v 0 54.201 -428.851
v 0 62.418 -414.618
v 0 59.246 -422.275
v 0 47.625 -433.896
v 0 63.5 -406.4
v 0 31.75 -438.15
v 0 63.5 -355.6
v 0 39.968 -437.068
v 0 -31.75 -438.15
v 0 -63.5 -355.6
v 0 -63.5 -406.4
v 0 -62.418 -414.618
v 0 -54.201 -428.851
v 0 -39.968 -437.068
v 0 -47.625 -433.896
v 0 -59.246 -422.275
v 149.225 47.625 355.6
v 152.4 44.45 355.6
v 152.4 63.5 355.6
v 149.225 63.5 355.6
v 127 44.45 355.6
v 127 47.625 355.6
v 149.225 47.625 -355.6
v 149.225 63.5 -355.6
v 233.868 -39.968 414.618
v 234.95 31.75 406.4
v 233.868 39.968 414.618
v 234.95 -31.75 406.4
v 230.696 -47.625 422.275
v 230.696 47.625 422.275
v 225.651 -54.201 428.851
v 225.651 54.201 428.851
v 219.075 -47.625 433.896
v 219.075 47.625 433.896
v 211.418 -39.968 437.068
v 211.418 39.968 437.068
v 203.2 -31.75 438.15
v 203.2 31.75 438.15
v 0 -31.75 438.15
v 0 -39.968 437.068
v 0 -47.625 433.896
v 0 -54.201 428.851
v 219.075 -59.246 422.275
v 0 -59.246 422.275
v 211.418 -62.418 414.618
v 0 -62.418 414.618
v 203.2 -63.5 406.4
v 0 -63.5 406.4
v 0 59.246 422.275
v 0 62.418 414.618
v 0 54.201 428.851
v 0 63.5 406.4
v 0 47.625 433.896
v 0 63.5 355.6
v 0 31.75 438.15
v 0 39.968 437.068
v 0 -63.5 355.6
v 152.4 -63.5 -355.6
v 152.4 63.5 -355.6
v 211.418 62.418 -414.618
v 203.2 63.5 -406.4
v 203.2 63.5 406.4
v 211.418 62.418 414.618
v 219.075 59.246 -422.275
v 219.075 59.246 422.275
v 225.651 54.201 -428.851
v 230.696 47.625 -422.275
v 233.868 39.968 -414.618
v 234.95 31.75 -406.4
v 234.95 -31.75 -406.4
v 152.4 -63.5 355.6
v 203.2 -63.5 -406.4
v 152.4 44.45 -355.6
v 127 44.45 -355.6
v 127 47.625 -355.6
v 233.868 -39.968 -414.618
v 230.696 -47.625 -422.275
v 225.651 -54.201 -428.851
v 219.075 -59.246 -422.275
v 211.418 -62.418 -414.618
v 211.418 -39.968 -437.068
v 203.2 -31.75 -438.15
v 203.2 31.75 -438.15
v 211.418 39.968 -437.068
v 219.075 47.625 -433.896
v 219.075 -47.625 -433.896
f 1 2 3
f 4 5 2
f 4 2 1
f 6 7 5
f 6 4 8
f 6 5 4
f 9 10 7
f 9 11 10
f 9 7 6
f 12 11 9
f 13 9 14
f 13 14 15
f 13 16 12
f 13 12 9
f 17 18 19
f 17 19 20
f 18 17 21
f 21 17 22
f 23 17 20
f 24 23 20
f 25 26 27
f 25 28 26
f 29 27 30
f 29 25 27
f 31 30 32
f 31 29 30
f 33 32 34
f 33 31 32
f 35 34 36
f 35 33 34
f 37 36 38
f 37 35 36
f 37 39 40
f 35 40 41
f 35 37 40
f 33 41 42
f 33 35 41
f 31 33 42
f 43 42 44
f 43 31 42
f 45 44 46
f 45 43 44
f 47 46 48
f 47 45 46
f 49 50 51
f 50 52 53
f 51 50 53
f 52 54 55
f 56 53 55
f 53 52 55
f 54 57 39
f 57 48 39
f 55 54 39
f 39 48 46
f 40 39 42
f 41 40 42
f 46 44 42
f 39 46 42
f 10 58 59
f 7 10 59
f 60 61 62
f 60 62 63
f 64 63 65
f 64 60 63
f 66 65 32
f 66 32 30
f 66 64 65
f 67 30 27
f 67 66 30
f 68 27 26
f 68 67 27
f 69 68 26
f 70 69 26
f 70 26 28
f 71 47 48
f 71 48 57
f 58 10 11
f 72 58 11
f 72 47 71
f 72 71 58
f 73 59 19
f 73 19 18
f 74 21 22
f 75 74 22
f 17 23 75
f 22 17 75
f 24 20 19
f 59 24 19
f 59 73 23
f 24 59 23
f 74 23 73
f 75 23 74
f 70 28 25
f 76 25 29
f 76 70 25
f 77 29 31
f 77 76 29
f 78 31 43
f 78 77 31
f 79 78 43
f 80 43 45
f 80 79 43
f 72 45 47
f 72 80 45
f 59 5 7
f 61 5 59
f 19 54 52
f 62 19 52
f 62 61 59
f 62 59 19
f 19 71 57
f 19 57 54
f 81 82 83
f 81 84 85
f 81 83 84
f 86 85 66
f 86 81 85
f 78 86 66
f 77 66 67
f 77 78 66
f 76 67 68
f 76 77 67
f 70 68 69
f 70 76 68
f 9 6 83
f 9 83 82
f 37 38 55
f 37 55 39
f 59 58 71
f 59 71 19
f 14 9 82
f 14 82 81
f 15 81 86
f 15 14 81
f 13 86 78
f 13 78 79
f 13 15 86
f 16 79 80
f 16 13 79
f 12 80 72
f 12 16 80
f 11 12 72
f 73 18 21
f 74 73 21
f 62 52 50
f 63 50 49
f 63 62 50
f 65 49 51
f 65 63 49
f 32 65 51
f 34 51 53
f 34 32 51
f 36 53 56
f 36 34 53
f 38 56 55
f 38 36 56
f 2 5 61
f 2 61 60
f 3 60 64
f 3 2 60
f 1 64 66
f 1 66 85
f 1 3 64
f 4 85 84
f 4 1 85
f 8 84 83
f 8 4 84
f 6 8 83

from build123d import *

# Parameters (mm, degrees)
CUT_EXTRUDE1_DEPTH      = 502.207716421
CUT_EXTRUDE1_DEPTH_BACK = 502.207716421
SKETCH4_W               = 22.225
SKETCH4_H               = 3.175
BOSS_EXTRUDE1_DEPTH     = 711.2


with BuildPart() as part:
    # Sweep1: sweep along a path in Sketch2
    with BuildLine(Plane(origin=(0, 0, 0), x_dir=(1, 0, 0), z_dir=(0, 1, 0))) as sweep1_path:
        Line((0, -355.6), (152.4, -355.6))
        Line((152.4, -355.6), (152.4, 355.6))
        Line((152.4, 355.6), (0, 355.6))
    # Sketch1 → Sweep1 (sweep)
    with BuildSketch(Plane(origin=(0, 0, 0), x_dir=(0, 0, -1), z_dir=(1, 0, 0))):
        with BuildLine():
            Line((-374.65, 63.5), (-355.6, 63.5))
            Line((-355.6, 63.5), (-355.6, -63.5))
            Line((-355.6, -63.5), (-374.65, -63.5))
            Line((-374.65, -63.5), (-406.4, -63.5))
            ThreePointArc((-406.4, -63.5), (-428.850640303, -54.200640303), (-438.15, -31.75))
            Line((-438.15, -31.75), (-438.15, 31.75))
            ThreePointArc((-438.15, 31.75), (-428.850640303, 54.200640303), (-406.4, 63.5))
            Line((-406.4, 63.5), (-374.65, 63.5))
        make_face()
    sweep(path=sweep1_path.line, transition=Transition.RIGHT)

    # Sketch3 → Cut-Extrude1 (cut, two sides: drawn at the far end of the back side and taken through both)
    with BuildSketch(Plane(origin=(0, 0, 0), x_dir=(1, 0, 0), z_dir=(0, 1, 0)).offset(-CUT_EXTRUDE1_DEPTH_BACK)):
        with BuildLine():
            ThreePointArc((234.95, -406.4), (225.650640303, -428.850640303), (203.2, -438.15))
            Line((203.2, -438.15), (234.95, -438.15))
            Line((234.95, -438.15), (234.95, -406.4))
        make_face()
        with BuildLine():
            ThreePointArc((203.2, 438.15), (225.650640303, 428.850640303), (234.95, 406.4))
            Line((234.95, 406.4), (234.95, 438.15))
            Line((234.95, 438.15), (203.2, 438.15))
        make_face()
    extrude(amount=CUT_EXTRUDE1_DEPTH + CUT_EXTRUDE1_DEPTH_BACK, mode=Mode.SUBTRACT)


with BuildPart() as body_2:
    # Sketch4 → Boss-Extrude1 (new body)
    with BuildSketch(Plane(origin=(0, 0, 355.6), x_dir=(-1, 0, 0), z_dir=(0, 0, -1))):
        Polygon((-149.225, 63.5), (-152.4, 63.5), (-152.4, 44.45), (-149.225, 44.45), (-149.225, 47.625), align=None)
        with Locations((-138.1125, 46.0375)):
            Rectangle(SKETCH4_W, SKETCH4_H)
    extrude(amount=BOSS_EXTRUDE1_DEPTH)


solid = Compound([part.part, body_2.part])
